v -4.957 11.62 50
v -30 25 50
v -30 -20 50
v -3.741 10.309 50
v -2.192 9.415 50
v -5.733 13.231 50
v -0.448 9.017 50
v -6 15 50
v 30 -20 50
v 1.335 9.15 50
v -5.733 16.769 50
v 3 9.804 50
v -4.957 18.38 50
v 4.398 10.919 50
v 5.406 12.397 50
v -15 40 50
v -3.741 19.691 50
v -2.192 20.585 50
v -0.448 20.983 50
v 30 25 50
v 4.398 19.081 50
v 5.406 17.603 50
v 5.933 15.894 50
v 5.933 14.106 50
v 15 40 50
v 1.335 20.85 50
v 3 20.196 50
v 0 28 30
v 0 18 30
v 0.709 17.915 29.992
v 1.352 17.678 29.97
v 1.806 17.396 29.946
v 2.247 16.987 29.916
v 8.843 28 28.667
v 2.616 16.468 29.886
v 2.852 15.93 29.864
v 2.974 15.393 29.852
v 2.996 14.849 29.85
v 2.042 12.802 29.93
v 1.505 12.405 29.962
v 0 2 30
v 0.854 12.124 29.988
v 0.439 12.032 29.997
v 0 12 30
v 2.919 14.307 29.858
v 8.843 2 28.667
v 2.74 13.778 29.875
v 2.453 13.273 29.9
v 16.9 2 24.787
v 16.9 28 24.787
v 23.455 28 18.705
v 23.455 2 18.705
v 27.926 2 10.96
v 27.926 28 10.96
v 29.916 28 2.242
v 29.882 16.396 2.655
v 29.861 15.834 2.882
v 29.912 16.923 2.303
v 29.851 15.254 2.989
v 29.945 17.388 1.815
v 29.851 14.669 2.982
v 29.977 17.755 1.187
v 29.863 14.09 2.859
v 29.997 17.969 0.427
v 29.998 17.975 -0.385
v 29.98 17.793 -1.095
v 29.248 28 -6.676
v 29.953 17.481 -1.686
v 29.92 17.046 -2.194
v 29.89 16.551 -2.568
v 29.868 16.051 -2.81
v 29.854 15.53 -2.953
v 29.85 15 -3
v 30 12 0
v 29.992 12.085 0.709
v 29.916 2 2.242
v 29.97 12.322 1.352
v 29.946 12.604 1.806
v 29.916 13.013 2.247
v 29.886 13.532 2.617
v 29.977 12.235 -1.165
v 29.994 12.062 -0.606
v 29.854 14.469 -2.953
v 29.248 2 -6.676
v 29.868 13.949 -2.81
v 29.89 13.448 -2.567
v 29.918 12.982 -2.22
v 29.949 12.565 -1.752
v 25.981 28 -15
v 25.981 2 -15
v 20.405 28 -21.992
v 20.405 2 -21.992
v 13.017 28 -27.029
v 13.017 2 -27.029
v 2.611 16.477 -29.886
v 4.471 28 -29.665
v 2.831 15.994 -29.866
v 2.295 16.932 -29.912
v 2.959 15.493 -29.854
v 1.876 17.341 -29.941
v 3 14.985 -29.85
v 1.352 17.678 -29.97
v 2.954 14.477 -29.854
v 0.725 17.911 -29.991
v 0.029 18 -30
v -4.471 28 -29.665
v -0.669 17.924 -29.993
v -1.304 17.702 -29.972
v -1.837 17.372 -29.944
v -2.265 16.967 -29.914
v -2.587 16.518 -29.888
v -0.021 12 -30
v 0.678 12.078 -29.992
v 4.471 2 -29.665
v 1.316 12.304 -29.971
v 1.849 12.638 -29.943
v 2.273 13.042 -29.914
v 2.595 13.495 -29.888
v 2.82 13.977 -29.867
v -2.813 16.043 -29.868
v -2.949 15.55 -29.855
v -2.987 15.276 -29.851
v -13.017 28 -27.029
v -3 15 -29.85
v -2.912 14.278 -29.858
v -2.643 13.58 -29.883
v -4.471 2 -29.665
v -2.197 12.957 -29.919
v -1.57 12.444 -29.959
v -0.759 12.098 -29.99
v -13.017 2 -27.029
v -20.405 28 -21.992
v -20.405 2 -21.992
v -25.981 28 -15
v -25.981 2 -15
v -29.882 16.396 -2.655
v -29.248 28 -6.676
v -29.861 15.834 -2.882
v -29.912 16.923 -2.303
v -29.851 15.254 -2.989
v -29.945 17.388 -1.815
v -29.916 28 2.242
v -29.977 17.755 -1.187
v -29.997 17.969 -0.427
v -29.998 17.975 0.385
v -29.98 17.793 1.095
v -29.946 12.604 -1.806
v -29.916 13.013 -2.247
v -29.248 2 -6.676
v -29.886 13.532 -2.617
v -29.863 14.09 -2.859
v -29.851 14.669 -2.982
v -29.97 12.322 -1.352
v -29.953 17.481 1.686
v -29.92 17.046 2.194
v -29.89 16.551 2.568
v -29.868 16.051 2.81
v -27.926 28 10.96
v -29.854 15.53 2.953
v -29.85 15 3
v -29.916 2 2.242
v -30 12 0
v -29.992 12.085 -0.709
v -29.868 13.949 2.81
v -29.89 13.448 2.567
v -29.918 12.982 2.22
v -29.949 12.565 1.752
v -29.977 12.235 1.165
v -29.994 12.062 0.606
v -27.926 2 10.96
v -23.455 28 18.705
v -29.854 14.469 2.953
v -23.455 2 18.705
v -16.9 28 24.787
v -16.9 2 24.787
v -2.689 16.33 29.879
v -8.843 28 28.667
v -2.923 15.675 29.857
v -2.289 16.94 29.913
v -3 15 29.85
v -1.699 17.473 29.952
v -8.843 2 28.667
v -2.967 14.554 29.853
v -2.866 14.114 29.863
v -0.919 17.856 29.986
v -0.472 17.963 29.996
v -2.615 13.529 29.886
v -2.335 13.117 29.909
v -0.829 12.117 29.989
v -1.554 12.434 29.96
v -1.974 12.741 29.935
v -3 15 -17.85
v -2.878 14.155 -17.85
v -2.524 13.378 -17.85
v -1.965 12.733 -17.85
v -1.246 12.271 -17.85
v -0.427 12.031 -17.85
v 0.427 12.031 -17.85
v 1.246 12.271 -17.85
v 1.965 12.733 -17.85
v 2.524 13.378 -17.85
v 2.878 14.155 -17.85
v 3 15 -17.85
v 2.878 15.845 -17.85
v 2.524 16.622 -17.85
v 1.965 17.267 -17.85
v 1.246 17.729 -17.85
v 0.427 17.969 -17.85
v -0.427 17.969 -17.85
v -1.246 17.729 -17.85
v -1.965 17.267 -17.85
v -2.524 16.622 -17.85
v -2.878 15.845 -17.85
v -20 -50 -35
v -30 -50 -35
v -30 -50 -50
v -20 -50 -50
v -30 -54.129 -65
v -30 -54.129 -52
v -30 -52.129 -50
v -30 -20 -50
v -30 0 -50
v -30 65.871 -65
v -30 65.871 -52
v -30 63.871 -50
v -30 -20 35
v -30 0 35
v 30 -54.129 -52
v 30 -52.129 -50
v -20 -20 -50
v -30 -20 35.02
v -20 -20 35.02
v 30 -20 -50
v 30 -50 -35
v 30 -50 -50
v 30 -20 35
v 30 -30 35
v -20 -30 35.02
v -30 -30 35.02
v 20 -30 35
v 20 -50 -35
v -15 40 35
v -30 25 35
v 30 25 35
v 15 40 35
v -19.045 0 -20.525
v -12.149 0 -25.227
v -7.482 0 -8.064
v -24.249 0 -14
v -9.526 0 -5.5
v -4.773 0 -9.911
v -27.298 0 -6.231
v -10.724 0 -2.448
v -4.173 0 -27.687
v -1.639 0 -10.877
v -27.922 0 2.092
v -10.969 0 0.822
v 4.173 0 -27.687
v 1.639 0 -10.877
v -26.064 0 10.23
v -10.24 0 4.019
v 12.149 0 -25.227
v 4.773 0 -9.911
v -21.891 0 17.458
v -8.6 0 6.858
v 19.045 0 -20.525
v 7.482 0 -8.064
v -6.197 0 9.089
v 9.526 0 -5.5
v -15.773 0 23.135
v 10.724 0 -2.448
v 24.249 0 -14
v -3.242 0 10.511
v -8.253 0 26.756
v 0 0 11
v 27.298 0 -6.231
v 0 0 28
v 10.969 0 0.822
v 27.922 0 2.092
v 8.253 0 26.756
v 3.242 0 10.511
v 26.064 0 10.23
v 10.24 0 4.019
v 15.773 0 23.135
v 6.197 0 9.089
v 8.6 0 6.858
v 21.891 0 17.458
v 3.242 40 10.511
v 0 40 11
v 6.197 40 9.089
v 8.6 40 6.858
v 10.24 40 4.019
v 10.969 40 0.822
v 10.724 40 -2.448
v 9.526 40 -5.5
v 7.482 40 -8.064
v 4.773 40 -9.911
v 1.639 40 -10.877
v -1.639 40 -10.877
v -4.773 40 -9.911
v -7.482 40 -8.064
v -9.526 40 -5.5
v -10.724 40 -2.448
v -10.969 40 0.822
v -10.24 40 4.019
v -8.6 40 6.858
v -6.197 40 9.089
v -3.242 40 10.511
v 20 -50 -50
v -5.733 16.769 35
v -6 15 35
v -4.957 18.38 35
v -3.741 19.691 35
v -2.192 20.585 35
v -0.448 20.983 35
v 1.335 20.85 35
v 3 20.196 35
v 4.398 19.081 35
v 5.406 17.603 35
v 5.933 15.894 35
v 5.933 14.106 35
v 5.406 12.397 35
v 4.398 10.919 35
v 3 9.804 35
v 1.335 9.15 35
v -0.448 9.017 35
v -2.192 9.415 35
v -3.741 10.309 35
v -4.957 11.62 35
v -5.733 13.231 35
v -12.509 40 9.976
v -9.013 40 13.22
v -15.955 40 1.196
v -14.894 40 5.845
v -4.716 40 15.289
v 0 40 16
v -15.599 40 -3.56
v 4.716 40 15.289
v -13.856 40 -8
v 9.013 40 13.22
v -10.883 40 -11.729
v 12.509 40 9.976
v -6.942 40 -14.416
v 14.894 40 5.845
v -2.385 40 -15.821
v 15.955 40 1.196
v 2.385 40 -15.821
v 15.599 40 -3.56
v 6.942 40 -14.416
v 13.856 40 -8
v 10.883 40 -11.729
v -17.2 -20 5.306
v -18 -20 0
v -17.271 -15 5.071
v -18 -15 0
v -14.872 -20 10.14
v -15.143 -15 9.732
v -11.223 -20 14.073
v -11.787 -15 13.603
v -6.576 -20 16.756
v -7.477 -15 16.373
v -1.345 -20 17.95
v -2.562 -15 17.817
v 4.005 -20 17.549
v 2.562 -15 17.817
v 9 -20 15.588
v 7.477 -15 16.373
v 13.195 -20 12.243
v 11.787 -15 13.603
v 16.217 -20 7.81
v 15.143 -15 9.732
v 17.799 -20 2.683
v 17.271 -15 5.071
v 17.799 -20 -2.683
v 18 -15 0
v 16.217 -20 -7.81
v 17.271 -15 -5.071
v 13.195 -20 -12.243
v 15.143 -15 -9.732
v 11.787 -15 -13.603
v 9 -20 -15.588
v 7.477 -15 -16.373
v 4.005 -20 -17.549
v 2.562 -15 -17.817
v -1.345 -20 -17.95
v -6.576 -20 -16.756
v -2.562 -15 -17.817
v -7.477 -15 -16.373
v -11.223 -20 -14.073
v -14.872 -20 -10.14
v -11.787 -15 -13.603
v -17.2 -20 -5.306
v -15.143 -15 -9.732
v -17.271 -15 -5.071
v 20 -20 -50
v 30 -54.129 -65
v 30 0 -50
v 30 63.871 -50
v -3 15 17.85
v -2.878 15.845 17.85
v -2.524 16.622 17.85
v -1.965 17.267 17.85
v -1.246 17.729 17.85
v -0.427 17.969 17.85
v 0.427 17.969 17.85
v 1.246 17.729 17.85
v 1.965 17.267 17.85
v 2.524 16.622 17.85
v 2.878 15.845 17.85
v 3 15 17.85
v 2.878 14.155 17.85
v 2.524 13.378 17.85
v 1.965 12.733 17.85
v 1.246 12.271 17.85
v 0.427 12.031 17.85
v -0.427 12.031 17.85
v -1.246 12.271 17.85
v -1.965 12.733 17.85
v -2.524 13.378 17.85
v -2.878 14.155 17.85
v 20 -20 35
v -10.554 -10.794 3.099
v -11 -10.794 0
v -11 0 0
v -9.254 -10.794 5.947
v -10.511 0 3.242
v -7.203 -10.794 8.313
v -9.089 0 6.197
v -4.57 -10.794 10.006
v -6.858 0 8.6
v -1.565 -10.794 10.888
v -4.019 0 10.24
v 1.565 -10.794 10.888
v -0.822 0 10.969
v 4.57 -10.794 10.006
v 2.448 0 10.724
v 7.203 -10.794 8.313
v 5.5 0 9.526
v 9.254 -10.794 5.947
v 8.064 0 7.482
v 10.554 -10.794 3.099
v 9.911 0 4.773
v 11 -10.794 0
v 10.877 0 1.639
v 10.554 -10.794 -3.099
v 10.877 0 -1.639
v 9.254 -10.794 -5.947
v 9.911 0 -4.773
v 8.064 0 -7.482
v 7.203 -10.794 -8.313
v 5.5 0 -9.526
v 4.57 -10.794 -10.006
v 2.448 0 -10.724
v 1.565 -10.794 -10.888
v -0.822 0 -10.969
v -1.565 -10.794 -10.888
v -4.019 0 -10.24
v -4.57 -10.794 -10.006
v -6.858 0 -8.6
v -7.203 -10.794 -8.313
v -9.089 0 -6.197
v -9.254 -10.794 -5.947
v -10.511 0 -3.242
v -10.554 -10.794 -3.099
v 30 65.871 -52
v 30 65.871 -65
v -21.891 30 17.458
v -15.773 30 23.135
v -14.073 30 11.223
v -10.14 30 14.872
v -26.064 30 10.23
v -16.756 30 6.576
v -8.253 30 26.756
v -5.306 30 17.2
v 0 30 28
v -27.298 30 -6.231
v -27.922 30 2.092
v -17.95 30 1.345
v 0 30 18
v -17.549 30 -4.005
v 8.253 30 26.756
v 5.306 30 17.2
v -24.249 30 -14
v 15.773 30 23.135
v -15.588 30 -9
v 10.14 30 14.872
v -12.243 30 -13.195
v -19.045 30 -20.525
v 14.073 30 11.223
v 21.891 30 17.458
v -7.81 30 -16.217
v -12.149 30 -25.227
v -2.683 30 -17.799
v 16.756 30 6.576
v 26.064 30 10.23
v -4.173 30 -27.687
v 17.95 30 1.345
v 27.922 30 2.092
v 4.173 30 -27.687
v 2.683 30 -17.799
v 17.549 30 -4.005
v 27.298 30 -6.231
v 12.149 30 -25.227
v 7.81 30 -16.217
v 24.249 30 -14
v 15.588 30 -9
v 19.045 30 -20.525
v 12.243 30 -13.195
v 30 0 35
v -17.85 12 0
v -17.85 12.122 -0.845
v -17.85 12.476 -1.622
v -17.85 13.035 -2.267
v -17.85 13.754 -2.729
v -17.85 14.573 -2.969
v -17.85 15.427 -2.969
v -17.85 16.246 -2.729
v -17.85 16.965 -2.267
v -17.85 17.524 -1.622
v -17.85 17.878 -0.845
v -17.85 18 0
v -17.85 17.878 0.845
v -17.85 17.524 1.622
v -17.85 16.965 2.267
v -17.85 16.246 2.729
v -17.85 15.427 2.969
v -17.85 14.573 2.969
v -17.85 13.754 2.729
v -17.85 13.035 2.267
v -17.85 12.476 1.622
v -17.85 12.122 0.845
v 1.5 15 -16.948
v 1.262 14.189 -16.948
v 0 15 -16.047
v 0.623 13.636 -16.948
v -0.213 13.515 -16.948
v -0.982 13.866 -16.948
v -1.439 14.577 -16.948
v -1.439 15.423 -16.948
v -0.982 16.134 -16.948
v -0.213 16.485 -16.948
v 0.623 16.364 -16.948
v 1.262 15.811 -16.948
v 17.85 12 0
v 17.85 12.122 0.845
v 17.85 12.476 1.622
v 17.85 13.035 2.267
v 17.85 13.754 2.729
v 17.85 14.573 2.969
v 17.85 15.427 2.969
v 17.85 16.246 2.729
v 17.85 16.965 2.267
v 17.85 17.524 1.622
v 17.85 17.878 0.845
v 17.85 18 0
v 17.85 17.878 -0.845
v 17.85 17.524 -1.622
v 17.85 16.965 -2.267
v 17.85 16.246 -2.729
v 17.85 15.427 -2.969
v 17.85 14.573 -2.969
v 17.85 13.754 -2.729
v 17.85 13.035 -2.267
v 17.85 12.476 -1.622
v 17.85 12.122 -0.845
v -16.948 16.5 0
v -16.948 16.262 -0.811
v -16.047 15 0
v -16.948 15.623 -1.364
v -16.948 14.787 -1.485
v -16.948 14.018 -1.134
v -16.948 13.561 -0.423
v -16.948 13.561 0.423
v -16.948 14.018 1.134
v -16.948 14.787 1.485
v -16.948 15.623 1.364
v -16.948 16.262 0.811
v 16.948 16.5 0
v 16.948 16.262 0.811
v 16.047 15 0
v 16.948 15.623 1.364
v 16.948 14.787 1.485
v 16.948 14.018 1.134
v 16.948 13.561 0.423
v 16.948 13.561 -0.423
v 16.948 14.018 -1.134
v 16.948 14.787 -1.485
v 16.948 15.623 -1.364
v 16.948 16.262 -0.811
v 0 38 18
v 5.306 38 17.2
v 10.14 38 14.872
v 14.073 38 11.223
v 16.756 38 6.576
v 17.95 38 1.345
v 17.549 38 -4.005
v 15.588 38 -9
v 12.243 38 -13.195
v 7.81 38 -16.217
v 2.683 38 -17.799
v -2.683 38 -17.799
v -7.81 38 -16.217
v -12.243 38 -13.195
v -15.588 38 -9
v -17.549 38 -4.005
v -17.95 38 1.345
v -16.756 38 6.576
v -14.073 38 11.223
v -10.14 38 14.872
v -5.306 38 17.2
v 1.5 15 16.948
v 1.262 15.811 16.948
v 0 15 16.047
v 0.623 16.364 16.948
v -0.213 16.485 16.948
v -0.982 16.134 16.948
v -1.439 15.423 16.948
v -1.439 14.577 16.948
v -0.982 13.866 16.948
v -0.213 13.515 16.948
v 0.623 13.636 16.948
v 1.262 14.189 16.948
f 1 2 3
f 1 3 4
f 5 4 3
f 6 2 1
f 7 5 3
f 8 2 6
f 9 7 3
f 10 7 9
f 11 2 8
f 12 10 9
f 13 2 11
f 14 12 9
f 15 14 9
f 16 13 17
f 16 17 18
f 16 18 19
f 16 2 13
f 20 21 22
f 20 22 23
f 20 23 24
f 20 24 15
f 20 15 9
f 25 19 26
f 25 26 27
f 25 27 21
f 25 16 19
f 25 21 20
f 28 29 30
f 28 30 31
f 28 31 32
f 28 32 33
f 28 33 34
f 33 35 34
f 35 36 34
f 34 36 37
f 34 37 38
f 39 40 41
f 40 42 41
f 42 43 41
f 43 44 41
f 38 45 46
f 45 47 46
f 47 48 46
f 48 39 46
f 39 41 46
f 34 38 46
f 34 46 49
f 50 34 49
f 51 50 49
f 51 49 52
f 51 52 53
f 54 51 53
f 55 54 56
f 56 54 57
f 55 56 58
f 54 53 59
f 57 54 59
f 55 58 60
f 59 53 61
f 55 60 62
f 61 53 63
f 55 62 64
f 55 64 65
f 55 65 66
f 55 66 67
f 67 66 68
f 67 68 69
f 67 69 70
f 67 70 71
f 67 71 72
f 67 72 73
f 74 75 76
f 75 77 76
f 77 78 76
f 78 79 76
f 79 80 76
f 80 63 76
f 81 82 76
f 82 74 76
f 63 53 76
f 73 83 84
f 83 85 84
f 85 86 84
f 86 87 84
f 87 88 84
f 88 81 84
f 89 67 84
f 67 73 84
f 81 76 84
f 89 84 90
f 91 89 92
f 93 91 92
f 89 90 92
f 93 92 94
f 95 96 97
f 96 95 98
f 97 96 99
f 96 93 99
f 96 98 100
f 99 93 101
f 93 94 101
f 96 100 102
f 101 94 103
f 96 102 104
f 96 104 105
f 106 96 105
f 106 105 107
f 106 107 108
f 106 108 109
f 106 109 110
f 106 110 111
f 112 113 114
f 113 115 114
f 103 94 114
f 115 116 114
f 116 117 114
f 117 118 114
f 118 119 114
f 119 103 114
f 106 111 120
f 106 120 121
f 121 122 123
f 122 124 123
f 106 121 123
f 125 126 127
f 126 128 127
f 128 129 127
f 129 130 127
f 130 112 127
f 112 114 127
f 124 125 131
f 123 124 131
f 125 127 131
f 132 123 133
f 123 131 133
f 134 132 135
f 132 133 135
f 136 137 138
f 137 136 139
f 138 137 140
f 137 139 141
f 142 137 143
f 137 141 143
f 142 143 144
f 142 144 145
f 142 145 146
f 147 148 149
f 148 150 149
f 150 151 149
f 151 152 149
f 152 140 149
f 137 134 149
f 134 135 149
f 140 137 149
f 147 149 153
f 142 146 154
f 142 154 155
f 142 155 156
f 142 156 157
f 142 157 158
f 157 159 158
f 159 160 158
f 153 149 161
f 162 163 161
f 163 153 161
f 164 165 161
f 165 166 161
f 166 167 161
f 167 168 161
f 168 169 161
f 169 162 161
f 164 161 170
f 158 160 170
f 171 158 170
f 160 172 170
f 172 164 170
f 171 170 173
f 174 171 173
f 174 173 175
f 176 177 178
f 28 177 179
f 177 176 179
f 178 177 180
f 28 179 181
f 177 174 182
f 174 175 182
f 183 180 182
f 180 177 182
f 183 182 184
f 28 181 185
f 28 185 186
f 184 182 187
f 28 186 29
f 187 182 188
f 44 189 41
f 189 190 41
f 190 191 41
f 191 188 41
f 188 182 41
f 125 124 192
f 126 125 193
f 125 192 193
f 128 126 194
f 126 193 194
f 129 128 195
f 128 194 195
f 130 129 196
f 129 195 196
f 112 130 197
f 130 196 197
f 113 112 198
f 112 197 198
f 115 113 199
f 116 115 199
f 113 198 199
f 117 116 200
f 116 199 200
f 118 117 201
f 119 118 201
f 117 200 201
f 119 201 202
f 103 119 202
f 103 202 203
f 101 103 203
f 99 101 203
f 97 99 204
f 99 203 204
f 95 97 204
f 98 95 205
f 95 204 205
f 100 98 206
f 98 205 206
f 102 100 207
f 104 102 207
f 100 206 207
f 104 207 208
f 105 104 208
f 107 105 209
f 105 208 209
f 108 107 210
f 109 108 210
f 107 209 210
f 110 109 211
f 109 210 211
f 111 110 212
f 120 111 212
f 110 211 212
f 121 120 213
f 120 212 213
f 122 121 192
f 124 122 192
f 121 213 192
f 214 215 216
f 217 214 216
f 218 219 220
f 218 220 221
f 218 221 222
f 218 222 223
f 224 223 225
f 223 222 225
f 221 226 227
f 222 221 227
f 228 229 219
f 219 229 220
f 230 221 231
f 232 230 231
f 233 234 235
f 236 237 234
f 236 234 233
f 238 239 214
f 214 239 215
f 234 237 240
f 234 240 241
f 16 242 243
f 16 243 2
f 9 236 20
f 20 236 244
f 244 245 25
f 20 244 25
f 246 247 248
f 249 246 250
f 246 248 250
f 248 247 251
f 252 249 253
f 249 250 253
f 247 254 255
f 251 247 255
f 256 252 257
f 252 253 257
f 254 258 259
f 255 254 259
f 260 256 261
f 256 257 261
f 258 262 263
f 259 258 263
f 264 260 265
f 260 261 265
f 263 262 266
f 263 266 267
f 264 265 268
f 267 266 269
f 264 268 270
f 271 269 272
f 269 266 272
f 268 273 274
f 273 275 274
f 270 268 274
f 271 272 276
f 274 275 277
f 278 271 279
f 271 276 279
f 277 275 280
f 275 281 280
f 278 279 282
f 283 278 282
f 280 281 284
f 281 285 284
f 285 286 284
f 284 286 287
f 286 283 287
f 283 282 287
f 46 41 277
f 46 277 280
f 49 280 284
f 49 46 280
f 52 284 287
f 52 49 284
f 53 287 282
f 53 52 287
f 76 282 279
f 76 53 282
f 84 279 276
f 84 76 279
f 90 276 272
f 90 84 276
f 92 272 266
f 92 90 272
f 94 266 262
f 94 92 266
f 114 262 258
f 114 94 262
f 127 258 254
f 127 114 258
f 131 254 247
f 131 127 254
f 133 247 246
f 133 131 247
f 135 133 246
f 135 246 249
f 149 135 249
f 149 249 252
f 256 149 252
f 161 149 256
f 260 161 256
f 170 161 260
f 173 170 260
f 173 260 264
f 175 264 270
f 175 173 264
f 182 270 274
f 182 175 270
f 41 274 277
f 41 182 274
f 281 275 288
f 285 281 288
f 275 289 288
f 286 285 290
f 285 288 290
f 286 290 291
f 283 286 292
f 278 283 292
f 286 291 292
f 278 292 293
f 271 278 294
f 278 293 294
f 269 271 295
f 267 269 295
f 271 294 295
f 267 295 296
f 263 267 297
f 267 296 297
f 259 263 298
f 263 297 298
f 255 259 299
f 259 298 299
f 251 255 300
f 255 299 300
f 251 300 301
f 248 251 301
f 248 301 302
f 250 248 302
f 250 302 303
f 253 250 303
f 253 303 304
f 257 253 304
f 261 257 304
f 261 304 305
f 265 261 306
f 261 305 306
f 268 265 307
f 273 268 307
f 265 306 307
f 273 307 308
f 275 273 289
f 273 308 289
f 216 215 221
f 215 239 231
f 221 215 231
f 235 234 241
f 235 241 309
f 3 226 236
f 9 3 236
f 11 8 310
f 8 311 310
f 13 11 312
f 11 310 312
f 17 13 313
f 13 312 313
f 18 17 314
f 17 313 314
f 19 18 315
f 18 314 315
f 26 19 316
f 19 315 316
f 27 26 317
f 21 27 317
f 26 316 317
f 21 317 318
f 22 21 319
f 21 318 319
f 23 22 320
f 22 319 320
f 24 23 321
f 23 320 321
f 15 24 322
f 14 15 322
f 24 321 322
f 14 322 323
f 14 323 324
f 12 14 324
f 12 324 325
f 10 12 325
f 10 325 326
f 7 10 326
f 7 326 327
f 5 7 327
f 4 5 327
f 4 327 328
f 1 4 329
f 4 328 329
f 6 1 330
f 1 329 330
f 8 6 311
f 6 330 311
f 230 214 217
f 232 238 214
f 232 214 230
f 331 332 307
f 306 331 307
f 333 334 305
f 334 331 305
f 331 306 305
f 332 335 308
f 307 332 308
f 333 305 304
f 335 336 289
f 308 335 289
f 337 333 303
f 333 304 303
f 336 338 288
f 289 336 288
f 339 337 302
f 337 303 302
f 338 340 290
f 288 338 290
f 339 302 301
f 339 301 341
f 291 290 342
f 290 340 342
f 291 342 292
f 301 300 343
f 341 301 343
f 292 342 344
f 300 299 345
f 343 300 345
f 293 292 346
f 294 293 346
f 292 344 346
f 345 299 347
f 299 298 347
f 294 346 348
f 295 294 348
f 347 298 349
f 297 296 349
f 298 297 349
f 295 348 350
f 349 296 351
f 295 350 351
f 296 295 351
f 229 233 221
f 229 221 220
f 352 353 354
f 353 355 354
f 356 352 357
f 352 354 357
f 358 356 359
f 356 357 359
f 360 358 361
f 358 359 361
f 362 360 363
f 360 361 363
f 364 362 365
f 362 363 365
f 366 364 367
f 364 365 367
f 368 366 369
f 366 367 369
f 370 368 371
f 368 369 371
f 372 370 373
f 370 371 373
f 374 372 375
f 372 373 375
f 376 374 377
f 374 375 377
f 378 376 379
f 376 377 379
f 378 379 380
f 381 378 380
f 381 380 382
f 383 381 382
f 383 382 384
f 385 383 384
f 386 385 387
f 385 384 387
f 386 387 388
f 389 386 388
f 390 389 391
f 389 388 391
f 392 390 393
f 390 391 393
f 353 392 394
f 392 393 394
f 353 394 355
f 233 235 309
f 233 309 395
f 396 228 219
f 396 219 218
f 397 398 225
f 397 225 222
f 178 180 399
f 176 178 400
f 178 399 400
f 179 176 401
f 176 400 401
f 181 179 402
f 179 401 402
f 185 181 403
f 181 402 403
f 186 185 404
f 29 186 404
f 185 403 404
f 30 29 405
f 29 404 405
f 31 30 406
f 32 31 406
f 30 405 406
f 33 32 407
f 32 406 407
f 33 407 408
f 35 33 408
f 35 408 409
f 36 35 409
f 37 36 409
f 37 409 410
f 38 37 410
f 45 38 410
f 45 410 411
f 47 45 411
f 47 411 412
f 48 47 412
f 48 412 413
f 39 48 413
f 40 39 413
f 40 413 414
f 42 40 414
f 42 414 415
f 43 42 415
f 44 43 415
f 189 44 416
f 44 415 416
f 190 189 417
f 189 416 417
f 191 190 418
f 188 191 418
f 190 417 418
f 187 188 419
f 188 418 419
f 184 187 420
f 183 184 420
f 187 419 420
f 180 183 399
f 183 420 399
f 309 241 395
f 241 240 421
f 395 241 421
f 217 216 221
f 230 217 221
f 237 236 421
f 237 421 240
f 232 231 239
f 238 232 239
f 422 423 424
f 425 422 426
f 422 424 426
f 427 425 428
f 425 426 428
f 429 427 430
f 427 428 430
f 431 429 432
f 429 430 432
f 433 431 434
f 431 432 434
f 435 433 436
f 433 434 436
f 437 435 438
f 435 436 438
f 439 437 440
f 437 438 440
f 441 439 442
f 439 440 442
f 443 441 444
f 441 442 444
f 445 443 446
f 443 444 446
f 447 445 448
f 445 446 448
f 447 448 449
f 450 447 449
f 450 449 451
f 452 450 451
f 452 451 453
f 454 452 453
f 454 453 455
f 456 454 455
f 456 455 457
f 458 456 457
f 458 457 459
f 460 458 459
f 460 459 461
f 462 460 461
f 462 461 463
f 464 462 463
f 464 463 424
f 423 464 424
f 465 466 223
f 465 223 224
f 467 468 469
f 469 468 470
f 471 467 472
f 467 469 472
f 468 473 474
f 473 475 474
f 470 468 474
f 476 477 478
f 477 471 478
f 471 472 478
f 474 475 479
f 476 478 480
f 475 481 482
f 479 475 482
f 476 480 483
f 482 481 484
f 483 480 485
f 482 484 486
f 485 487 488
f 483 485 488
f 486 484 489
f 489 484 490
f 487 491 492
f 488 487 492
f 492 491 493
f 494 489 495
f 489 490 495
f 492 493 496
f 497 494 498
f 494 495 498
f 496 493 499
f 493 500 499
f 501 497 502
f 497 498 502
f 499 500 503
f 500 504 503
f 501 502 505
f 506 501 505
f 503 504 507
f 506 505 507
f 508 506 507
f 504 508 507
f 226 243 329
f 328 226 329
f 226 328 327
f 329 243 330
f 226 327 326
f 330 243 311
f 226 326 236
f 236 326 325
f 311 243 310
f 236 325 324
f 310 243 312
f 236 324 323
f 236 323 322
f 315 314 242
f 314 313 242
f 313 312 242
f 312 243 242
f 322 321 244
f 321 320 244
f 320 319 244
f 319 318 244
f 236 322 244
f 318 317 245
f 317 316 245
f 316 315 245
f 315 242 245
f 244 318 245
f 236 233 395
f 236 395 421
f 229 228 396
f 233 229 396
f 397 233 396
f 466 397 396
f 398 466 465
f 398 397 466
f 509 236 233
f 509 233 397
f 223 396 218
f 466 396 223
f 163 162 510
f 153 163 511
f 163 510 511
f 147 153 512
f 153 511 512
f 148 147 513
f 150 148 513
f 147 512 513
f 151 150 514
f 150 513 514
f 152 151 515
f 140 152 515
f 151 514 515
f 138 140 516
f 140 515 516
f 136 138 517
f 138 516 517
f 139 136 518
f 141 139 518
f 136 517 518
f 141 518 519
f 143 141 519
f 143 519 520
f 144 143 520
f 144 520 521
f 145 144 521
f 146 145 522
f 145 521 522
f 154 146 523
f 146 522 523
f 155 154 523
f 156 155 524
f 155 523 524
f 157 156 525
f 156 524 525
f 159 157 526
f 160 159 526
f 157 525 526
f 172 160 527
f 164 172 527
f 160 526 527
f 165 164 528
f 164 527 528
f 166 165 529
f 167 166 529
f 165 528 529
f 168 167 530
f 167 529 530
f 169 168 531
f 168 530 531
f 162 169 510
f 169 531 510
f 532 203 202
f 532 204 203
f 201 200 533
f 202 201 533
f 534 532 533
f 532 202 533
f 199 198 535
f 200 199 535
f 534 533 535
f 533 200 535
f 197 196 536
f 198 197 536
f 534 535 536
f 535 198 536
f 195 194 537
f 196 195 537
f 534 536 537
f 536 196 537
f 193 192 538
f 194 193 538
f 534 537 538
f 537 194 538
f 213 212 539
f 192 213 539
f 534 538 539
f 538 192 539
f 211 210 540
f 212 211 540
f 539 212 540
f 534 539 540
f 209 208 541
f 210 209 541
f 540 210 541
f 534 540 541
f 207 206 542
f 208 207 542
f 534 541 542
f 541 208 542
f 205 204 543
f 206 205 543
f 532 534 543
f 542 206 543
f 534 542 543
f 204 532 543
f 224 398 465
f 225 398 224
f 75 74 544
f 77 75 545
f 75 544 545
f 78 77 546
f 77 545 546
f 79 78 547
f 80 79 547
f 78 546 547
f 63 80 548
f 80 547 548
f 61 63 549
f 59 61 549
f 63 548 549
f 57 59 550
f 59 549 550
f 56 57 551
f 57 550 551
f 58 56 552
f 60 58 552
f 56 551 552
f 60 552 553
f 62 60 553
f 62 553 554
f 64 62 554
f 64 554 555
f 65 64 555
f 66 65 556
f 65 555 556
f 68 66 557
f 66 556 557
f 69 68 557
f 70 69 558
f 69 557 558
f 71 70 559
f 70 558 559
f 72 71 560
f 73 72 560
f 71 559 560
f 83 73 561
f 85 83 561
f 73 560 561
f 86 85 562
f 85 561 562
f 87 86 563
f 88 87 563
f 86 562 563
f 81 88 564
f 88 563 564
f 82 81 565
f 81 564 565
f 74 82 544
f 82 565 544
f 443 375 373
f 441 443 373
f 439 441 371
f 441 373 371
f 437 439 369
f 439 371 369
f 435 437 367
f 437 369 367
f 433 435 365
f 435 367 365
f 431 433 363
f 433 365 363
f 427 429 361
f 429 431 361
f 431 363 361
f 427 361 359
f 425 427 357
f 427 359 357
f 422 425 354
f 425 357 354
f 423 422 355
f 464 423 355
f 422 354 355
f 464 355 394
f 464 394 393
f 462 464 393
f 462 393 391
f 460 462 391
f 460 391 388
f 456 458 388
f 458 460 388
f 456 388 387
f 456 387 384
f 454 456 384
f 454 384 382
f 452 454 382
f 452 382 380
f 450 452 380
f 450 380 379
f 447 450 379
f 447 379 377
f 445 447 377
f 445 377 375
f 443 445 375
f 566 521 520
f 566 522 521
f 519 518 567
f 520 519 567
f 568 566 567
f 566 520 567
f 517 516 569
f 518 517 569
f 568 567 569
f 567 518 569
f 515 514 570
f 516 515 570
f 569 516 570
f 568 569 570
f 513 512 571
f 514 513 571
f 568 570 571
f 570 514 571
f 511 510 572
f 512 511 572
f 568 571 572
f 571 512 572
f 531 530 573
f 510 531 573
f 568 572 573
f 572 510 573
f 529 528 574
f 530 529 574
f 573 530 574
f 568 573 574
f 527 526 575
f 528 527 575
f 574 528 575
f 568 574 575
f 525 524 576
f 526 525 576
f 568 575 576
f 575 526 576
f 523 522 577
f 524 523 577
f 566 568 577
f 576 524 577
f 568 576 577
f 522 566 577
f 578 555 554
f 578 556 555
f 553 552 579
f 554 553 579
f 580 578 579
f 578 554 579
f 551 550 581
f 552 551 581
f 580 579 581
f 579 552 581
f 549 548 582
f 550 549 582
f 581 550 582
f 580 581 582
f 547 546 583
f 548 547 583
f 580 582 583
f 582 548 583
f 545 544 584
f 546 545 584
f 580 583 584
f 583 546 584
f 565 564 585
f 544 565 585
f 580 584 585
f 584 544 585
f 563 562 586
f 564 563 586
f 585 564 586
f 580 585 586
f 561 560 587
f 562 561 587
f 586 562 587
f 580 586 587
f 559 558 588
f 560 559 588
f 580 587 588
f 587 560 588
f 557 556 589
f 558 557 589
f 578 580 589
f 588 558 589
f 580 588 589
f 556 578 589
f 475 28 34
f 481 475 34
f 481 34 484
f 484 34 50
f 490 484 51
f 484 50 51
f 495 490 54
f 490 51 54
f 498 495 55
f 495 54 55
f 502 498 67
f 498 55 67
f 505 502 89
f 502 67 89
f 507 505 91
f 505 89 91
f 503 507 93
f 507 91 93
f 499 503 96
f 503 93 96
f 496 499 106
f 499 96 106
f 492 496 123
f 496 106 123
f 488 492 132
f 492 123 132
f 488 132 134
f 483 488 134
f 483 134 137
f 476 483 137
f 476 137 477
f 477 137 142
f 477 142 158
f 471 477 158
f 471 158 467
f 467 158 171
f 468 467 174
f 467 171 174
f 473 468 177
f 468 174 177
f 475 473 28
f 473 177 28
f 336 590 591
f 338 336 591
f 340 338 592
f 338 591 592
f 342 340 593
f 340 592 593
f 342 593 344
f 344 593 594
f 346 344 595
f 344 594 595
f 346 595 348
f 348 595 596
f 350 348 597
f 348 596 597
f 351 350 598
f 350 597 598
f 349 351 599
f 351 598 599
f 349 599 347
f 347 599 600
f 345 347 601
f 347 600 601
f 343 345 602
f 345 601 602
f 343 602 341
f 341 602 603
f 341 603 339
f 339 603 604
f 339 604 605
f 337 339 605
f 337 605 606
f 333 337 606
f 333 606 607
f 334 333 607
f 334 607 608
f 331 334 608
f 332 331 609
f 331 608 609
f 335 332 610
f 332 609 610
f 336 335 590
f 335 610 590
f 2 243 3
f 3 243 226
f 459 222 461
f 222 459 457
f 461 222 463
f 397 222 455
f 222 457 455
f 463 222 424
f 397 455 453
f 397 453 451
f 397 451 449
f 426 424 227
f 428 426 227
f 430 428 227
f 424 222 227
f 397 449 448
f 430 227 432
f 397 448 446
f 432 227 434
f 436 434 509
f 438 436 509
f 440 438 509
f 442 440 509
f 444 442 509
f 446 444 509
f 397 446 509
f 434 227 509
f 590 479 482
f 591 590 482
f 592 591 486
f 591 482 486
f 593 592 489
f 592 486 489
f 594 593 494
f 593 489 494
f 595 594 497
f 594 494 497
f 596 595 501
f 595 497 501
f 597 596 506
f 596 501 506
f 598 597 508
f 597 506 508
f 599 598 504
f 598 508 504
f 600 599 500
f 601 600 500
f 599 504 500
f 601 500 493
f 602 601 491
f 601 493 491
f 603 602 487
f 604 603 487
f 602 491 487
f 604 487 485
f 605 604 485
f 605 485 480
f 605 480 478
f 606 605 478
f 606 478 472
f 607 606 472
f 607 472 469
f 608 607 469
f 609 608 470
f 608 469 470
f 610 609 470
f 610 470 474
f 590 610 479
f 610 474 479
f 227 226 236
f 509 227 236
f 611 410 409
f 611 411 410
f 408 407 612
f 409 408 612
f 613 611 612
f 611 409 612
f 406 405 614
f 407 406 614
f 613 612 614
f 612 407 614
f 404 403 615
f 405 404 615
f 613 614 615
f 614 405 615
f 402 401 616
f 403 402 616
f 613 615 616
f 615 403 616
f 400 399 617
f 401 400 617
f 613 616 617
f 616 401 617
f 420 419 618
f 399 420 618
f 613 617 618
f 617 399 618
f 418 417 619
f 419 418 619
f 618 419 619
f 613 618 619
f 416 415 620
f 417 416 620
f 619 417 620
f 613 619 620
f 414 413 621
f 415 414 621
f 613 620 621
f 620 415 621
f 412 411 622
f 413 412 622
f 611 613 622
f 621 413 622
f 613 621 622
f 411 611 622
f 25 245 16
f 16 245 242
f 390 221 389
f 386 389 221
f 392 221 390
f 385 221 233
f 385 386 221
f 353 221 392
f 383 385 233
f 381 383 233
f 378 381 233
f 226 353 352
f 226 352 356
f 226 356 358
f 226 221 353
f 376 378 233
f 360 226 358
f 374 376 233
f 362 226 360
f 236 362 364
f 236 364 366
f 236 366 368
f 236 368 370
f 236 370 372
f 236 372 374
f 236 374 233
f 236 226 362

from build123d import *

# Parameters (mm, degrees)
F2_SIZE   = 2
F5_D      = 6
F5_DEPTH  = 12
F5_START  = 0.150377
F5_TIP    = 1.8025818571
F8_D      = 6
F8_DEPTH  = 12
F8_START  = 0.150377
F8_TIP    = 1.8025818571
F11_D     = 6
F11_DEPTH = 12
F11_START = 0.150377
F11_TIP   = 1.8025818571
F14_D     = 6
F14_DEPTH = 12
F14_START = 0.150377
F14_TIP   = 1.8025818571
F17_DEPTH = 15
F18_SIZE  = 15
F20_D     = 12
F20_DEPTH = 15
F20_TIP   = 3.6051637142
F22_W     = 60
F22_H     = 85
F23_DEPTH = 20
F25_DEPTH = 60
F27_D     = 36
F27_DEPTH = 5
F27_TIP   = 10.8154911425
F29_D     = 22
F29_DEPTH = 100
F29_TIP   = 6.6094668093
F30_SIZE  = 2
F32_DEPTH = 10
F34_DEPTH = 10


with BuildPart() as f1:
    # F0 (on Right) → F1 (revolve)
    with BuildSketch(Plane.YZ):
        Polygon((0, 30), (0, 11), (40, 11), (40, 18), (30, 18), (30, 30), align=None)
    revolve(axis=Axis((0, 0.3758966923, 0), (0, 1, 0)))

    # F2
    f2_edges = [f1.edges().sort_by_distance(p)[0] for p in [
        (0, 30, -30),
        (0, 0, -30),
        (0, 40, -18),
    ]]
    chamfer(f2_edges, length=F2_SIZE)

    # F5
    # its depths count from where the whole tool has entered the part; down to there all is cleared
    with Locations(Plane.YZ.offset(30).offset(-F5_START)):
        with Locations((15, 0)):
            Hole(F5_D / 2, depth=F5_DEPTH)
            with Locations((0, 0, -(F5_DEPTH + F5_TIP / 2))):  # 118° drill point
                Cone(0, F5_D / 2, F5_TIP, mode=Mode.SUBTRACT)

    # F8
    # its depths count from where the whole tool has entered the part; down to there all is cleared
    with Locations(Plane.XY.offset(30).offset(-F8_START)):
        with Locations((0, 15)):
            Hole(F8_D / 2, depth=F8_DEPTH)
            with Locations((0, 0, -(F8_DEPTH + F8_TIP / 2))):  # 118° drill point
                Cone(0, F8_D / 2, F8_TIP, mode=Mode.SUBTRACT)

    # F11
    # its depths count from where the whole tool has entered the part; down to there all is cleared
    with Locations(Plane(origin=(0, 0, -30), x_dir=(1, 0, 0), z_dir=(0, 0, -1)).offset(-F11_START)):
        with Locations((0, -15)):
            Hole(F11_D / 2, depth=F11_DEPTH)
            with Locations((0, 0, -(F11_DEPTH + F11_TIP / 2))):  # 118° drill point
                Cone(0, F11_D / 2, F11_TIP, mode=Mode.SUBTRACT)

    # F14
    # its depths count from where the whole tool has entered the part; down to there all is cleared
    with Locations(Plane(origin=(-30, 0, 0), x_dir=(0, 1, 0), z_dir=(-1, 0, 0)).offset(-F14_START)):
        with Locations((15, 0)):
            Hole(F14_D / 2, depth=F14_DEPTH)
            with Locations((0, 0, -(F14_DEPTH + F14_TIP / 2))):  # 118° drill point
                Cone(0, F14_D / 2, F14_TIP, mode=Mode.SUBTRACT)


with BuildPart() as f17:
    # F16 (on offset) → F17 (new body)
    with BuildSketch(Plane.XY.offset(35)):
        Polygon((30, -20), (30, 0), (30, 30), (30, 40), (-30, 40), (-30, 30), (-30, 0), (-30, -20), align=None)
    extrude(amount=F17_DEPTH)

    # F18
    f18_edges = [f17.edges().sort_by_distance(p)[0] for p in [
        (30, 40, 42.5),
        (-30, 40, 42.5),
    ]]
    chamfer(f18_edges, length=F18_SIZE)

    # F20
    with Locations(Plane.XY.offset(50)):
        with Locations((0, 15)):
            Hole(F20_D / 2, depth=F20_DEPTH)
            with Locations((0, 0, -(F20_DEPTH + F20_TIP / 2))):  # 118° drill point
                Cone(0, F20_D / 2, F20_TIP, mode=Mode.SUBTRACT)


with BuildPart() as f23:
    # F22 (on offset) → F23 (new body)
    with BuildSketch(Plane.XZ.offset(20)):
        with Locations((0, -7.5)):
            Rectangle(F22_W, F22_H)
    extrude(amount=-F23_DEPTH)

    # F24 (on offset) → F25 (join)
    with BuildSketch(Plane.YZ.offset(30)):
        Polygon((-20, -50), (-54.1288815439, -50), (-54.1288815439, -65), (65.8711184561, -65), (65.8711184561, -50), (0, -50), align=None)
    extrude(amount=-F25_DEPTH)

    # F27
    with Locations(Plane.XZ.offset(20)):
        with Locations((0, 0)):
            Hole(F27_D / 2, depth=F27_DEPTH)
            with Locations((0, 0, -(F27_DEPTH + F27_TIP / 2))):  # 118° drill point
                Cone(0, F27_D / 2, F27_TIP, mode=Mode.SUBTRACT)

    # F29
    with Locations(Plane.XZ.offset(20)):
        with Locations((0, 0)):
            Hole(F29_D / 2, depth=F29_DEPTH)
            with Locations((0, 0, -(F29_DEPTH + F29_TIP / 2))):  # 118° drill point
                Cone(0, F29_D / 2, F29_TIP, mode=Mode.SUBTRACT)

    # F30
    f30_edges = [f23.edges().sort_by_distance(p)[0] for p in [
        (0, -54.128882, -50),
        (0, 65.871118, -50),
    ]]
    chamfer(f30_edges, length=F30_SIZE)


with BuildPart() as f32:
    # F31 (on offset) → F32 (new body)
    with BuildSketch(Plane.YZ.offset(30)):
        Polygon((-20, -50), (-20, 0), (-20, 35), (-30, 35), (-50, -35), (-50, -50), align=None)
    extrude(amount=-F32_DEPTH)


with BuildPart() as f34:
    # F33 (on offset) → F34 (new body)
    with BuildSketch(Plane.YZ.offset(-30)):
        Polygon((-20, -50), (-20, 0), (-20, 35), (-20, 35.0201614201), (-30, 35.0201614201), (-50, -35), (-50, -50), align=None)
    extrude(amount=F34_DEPTH)


solid = Compound([f1.part, f17.part, f23.part, f32.part, f34.part])
